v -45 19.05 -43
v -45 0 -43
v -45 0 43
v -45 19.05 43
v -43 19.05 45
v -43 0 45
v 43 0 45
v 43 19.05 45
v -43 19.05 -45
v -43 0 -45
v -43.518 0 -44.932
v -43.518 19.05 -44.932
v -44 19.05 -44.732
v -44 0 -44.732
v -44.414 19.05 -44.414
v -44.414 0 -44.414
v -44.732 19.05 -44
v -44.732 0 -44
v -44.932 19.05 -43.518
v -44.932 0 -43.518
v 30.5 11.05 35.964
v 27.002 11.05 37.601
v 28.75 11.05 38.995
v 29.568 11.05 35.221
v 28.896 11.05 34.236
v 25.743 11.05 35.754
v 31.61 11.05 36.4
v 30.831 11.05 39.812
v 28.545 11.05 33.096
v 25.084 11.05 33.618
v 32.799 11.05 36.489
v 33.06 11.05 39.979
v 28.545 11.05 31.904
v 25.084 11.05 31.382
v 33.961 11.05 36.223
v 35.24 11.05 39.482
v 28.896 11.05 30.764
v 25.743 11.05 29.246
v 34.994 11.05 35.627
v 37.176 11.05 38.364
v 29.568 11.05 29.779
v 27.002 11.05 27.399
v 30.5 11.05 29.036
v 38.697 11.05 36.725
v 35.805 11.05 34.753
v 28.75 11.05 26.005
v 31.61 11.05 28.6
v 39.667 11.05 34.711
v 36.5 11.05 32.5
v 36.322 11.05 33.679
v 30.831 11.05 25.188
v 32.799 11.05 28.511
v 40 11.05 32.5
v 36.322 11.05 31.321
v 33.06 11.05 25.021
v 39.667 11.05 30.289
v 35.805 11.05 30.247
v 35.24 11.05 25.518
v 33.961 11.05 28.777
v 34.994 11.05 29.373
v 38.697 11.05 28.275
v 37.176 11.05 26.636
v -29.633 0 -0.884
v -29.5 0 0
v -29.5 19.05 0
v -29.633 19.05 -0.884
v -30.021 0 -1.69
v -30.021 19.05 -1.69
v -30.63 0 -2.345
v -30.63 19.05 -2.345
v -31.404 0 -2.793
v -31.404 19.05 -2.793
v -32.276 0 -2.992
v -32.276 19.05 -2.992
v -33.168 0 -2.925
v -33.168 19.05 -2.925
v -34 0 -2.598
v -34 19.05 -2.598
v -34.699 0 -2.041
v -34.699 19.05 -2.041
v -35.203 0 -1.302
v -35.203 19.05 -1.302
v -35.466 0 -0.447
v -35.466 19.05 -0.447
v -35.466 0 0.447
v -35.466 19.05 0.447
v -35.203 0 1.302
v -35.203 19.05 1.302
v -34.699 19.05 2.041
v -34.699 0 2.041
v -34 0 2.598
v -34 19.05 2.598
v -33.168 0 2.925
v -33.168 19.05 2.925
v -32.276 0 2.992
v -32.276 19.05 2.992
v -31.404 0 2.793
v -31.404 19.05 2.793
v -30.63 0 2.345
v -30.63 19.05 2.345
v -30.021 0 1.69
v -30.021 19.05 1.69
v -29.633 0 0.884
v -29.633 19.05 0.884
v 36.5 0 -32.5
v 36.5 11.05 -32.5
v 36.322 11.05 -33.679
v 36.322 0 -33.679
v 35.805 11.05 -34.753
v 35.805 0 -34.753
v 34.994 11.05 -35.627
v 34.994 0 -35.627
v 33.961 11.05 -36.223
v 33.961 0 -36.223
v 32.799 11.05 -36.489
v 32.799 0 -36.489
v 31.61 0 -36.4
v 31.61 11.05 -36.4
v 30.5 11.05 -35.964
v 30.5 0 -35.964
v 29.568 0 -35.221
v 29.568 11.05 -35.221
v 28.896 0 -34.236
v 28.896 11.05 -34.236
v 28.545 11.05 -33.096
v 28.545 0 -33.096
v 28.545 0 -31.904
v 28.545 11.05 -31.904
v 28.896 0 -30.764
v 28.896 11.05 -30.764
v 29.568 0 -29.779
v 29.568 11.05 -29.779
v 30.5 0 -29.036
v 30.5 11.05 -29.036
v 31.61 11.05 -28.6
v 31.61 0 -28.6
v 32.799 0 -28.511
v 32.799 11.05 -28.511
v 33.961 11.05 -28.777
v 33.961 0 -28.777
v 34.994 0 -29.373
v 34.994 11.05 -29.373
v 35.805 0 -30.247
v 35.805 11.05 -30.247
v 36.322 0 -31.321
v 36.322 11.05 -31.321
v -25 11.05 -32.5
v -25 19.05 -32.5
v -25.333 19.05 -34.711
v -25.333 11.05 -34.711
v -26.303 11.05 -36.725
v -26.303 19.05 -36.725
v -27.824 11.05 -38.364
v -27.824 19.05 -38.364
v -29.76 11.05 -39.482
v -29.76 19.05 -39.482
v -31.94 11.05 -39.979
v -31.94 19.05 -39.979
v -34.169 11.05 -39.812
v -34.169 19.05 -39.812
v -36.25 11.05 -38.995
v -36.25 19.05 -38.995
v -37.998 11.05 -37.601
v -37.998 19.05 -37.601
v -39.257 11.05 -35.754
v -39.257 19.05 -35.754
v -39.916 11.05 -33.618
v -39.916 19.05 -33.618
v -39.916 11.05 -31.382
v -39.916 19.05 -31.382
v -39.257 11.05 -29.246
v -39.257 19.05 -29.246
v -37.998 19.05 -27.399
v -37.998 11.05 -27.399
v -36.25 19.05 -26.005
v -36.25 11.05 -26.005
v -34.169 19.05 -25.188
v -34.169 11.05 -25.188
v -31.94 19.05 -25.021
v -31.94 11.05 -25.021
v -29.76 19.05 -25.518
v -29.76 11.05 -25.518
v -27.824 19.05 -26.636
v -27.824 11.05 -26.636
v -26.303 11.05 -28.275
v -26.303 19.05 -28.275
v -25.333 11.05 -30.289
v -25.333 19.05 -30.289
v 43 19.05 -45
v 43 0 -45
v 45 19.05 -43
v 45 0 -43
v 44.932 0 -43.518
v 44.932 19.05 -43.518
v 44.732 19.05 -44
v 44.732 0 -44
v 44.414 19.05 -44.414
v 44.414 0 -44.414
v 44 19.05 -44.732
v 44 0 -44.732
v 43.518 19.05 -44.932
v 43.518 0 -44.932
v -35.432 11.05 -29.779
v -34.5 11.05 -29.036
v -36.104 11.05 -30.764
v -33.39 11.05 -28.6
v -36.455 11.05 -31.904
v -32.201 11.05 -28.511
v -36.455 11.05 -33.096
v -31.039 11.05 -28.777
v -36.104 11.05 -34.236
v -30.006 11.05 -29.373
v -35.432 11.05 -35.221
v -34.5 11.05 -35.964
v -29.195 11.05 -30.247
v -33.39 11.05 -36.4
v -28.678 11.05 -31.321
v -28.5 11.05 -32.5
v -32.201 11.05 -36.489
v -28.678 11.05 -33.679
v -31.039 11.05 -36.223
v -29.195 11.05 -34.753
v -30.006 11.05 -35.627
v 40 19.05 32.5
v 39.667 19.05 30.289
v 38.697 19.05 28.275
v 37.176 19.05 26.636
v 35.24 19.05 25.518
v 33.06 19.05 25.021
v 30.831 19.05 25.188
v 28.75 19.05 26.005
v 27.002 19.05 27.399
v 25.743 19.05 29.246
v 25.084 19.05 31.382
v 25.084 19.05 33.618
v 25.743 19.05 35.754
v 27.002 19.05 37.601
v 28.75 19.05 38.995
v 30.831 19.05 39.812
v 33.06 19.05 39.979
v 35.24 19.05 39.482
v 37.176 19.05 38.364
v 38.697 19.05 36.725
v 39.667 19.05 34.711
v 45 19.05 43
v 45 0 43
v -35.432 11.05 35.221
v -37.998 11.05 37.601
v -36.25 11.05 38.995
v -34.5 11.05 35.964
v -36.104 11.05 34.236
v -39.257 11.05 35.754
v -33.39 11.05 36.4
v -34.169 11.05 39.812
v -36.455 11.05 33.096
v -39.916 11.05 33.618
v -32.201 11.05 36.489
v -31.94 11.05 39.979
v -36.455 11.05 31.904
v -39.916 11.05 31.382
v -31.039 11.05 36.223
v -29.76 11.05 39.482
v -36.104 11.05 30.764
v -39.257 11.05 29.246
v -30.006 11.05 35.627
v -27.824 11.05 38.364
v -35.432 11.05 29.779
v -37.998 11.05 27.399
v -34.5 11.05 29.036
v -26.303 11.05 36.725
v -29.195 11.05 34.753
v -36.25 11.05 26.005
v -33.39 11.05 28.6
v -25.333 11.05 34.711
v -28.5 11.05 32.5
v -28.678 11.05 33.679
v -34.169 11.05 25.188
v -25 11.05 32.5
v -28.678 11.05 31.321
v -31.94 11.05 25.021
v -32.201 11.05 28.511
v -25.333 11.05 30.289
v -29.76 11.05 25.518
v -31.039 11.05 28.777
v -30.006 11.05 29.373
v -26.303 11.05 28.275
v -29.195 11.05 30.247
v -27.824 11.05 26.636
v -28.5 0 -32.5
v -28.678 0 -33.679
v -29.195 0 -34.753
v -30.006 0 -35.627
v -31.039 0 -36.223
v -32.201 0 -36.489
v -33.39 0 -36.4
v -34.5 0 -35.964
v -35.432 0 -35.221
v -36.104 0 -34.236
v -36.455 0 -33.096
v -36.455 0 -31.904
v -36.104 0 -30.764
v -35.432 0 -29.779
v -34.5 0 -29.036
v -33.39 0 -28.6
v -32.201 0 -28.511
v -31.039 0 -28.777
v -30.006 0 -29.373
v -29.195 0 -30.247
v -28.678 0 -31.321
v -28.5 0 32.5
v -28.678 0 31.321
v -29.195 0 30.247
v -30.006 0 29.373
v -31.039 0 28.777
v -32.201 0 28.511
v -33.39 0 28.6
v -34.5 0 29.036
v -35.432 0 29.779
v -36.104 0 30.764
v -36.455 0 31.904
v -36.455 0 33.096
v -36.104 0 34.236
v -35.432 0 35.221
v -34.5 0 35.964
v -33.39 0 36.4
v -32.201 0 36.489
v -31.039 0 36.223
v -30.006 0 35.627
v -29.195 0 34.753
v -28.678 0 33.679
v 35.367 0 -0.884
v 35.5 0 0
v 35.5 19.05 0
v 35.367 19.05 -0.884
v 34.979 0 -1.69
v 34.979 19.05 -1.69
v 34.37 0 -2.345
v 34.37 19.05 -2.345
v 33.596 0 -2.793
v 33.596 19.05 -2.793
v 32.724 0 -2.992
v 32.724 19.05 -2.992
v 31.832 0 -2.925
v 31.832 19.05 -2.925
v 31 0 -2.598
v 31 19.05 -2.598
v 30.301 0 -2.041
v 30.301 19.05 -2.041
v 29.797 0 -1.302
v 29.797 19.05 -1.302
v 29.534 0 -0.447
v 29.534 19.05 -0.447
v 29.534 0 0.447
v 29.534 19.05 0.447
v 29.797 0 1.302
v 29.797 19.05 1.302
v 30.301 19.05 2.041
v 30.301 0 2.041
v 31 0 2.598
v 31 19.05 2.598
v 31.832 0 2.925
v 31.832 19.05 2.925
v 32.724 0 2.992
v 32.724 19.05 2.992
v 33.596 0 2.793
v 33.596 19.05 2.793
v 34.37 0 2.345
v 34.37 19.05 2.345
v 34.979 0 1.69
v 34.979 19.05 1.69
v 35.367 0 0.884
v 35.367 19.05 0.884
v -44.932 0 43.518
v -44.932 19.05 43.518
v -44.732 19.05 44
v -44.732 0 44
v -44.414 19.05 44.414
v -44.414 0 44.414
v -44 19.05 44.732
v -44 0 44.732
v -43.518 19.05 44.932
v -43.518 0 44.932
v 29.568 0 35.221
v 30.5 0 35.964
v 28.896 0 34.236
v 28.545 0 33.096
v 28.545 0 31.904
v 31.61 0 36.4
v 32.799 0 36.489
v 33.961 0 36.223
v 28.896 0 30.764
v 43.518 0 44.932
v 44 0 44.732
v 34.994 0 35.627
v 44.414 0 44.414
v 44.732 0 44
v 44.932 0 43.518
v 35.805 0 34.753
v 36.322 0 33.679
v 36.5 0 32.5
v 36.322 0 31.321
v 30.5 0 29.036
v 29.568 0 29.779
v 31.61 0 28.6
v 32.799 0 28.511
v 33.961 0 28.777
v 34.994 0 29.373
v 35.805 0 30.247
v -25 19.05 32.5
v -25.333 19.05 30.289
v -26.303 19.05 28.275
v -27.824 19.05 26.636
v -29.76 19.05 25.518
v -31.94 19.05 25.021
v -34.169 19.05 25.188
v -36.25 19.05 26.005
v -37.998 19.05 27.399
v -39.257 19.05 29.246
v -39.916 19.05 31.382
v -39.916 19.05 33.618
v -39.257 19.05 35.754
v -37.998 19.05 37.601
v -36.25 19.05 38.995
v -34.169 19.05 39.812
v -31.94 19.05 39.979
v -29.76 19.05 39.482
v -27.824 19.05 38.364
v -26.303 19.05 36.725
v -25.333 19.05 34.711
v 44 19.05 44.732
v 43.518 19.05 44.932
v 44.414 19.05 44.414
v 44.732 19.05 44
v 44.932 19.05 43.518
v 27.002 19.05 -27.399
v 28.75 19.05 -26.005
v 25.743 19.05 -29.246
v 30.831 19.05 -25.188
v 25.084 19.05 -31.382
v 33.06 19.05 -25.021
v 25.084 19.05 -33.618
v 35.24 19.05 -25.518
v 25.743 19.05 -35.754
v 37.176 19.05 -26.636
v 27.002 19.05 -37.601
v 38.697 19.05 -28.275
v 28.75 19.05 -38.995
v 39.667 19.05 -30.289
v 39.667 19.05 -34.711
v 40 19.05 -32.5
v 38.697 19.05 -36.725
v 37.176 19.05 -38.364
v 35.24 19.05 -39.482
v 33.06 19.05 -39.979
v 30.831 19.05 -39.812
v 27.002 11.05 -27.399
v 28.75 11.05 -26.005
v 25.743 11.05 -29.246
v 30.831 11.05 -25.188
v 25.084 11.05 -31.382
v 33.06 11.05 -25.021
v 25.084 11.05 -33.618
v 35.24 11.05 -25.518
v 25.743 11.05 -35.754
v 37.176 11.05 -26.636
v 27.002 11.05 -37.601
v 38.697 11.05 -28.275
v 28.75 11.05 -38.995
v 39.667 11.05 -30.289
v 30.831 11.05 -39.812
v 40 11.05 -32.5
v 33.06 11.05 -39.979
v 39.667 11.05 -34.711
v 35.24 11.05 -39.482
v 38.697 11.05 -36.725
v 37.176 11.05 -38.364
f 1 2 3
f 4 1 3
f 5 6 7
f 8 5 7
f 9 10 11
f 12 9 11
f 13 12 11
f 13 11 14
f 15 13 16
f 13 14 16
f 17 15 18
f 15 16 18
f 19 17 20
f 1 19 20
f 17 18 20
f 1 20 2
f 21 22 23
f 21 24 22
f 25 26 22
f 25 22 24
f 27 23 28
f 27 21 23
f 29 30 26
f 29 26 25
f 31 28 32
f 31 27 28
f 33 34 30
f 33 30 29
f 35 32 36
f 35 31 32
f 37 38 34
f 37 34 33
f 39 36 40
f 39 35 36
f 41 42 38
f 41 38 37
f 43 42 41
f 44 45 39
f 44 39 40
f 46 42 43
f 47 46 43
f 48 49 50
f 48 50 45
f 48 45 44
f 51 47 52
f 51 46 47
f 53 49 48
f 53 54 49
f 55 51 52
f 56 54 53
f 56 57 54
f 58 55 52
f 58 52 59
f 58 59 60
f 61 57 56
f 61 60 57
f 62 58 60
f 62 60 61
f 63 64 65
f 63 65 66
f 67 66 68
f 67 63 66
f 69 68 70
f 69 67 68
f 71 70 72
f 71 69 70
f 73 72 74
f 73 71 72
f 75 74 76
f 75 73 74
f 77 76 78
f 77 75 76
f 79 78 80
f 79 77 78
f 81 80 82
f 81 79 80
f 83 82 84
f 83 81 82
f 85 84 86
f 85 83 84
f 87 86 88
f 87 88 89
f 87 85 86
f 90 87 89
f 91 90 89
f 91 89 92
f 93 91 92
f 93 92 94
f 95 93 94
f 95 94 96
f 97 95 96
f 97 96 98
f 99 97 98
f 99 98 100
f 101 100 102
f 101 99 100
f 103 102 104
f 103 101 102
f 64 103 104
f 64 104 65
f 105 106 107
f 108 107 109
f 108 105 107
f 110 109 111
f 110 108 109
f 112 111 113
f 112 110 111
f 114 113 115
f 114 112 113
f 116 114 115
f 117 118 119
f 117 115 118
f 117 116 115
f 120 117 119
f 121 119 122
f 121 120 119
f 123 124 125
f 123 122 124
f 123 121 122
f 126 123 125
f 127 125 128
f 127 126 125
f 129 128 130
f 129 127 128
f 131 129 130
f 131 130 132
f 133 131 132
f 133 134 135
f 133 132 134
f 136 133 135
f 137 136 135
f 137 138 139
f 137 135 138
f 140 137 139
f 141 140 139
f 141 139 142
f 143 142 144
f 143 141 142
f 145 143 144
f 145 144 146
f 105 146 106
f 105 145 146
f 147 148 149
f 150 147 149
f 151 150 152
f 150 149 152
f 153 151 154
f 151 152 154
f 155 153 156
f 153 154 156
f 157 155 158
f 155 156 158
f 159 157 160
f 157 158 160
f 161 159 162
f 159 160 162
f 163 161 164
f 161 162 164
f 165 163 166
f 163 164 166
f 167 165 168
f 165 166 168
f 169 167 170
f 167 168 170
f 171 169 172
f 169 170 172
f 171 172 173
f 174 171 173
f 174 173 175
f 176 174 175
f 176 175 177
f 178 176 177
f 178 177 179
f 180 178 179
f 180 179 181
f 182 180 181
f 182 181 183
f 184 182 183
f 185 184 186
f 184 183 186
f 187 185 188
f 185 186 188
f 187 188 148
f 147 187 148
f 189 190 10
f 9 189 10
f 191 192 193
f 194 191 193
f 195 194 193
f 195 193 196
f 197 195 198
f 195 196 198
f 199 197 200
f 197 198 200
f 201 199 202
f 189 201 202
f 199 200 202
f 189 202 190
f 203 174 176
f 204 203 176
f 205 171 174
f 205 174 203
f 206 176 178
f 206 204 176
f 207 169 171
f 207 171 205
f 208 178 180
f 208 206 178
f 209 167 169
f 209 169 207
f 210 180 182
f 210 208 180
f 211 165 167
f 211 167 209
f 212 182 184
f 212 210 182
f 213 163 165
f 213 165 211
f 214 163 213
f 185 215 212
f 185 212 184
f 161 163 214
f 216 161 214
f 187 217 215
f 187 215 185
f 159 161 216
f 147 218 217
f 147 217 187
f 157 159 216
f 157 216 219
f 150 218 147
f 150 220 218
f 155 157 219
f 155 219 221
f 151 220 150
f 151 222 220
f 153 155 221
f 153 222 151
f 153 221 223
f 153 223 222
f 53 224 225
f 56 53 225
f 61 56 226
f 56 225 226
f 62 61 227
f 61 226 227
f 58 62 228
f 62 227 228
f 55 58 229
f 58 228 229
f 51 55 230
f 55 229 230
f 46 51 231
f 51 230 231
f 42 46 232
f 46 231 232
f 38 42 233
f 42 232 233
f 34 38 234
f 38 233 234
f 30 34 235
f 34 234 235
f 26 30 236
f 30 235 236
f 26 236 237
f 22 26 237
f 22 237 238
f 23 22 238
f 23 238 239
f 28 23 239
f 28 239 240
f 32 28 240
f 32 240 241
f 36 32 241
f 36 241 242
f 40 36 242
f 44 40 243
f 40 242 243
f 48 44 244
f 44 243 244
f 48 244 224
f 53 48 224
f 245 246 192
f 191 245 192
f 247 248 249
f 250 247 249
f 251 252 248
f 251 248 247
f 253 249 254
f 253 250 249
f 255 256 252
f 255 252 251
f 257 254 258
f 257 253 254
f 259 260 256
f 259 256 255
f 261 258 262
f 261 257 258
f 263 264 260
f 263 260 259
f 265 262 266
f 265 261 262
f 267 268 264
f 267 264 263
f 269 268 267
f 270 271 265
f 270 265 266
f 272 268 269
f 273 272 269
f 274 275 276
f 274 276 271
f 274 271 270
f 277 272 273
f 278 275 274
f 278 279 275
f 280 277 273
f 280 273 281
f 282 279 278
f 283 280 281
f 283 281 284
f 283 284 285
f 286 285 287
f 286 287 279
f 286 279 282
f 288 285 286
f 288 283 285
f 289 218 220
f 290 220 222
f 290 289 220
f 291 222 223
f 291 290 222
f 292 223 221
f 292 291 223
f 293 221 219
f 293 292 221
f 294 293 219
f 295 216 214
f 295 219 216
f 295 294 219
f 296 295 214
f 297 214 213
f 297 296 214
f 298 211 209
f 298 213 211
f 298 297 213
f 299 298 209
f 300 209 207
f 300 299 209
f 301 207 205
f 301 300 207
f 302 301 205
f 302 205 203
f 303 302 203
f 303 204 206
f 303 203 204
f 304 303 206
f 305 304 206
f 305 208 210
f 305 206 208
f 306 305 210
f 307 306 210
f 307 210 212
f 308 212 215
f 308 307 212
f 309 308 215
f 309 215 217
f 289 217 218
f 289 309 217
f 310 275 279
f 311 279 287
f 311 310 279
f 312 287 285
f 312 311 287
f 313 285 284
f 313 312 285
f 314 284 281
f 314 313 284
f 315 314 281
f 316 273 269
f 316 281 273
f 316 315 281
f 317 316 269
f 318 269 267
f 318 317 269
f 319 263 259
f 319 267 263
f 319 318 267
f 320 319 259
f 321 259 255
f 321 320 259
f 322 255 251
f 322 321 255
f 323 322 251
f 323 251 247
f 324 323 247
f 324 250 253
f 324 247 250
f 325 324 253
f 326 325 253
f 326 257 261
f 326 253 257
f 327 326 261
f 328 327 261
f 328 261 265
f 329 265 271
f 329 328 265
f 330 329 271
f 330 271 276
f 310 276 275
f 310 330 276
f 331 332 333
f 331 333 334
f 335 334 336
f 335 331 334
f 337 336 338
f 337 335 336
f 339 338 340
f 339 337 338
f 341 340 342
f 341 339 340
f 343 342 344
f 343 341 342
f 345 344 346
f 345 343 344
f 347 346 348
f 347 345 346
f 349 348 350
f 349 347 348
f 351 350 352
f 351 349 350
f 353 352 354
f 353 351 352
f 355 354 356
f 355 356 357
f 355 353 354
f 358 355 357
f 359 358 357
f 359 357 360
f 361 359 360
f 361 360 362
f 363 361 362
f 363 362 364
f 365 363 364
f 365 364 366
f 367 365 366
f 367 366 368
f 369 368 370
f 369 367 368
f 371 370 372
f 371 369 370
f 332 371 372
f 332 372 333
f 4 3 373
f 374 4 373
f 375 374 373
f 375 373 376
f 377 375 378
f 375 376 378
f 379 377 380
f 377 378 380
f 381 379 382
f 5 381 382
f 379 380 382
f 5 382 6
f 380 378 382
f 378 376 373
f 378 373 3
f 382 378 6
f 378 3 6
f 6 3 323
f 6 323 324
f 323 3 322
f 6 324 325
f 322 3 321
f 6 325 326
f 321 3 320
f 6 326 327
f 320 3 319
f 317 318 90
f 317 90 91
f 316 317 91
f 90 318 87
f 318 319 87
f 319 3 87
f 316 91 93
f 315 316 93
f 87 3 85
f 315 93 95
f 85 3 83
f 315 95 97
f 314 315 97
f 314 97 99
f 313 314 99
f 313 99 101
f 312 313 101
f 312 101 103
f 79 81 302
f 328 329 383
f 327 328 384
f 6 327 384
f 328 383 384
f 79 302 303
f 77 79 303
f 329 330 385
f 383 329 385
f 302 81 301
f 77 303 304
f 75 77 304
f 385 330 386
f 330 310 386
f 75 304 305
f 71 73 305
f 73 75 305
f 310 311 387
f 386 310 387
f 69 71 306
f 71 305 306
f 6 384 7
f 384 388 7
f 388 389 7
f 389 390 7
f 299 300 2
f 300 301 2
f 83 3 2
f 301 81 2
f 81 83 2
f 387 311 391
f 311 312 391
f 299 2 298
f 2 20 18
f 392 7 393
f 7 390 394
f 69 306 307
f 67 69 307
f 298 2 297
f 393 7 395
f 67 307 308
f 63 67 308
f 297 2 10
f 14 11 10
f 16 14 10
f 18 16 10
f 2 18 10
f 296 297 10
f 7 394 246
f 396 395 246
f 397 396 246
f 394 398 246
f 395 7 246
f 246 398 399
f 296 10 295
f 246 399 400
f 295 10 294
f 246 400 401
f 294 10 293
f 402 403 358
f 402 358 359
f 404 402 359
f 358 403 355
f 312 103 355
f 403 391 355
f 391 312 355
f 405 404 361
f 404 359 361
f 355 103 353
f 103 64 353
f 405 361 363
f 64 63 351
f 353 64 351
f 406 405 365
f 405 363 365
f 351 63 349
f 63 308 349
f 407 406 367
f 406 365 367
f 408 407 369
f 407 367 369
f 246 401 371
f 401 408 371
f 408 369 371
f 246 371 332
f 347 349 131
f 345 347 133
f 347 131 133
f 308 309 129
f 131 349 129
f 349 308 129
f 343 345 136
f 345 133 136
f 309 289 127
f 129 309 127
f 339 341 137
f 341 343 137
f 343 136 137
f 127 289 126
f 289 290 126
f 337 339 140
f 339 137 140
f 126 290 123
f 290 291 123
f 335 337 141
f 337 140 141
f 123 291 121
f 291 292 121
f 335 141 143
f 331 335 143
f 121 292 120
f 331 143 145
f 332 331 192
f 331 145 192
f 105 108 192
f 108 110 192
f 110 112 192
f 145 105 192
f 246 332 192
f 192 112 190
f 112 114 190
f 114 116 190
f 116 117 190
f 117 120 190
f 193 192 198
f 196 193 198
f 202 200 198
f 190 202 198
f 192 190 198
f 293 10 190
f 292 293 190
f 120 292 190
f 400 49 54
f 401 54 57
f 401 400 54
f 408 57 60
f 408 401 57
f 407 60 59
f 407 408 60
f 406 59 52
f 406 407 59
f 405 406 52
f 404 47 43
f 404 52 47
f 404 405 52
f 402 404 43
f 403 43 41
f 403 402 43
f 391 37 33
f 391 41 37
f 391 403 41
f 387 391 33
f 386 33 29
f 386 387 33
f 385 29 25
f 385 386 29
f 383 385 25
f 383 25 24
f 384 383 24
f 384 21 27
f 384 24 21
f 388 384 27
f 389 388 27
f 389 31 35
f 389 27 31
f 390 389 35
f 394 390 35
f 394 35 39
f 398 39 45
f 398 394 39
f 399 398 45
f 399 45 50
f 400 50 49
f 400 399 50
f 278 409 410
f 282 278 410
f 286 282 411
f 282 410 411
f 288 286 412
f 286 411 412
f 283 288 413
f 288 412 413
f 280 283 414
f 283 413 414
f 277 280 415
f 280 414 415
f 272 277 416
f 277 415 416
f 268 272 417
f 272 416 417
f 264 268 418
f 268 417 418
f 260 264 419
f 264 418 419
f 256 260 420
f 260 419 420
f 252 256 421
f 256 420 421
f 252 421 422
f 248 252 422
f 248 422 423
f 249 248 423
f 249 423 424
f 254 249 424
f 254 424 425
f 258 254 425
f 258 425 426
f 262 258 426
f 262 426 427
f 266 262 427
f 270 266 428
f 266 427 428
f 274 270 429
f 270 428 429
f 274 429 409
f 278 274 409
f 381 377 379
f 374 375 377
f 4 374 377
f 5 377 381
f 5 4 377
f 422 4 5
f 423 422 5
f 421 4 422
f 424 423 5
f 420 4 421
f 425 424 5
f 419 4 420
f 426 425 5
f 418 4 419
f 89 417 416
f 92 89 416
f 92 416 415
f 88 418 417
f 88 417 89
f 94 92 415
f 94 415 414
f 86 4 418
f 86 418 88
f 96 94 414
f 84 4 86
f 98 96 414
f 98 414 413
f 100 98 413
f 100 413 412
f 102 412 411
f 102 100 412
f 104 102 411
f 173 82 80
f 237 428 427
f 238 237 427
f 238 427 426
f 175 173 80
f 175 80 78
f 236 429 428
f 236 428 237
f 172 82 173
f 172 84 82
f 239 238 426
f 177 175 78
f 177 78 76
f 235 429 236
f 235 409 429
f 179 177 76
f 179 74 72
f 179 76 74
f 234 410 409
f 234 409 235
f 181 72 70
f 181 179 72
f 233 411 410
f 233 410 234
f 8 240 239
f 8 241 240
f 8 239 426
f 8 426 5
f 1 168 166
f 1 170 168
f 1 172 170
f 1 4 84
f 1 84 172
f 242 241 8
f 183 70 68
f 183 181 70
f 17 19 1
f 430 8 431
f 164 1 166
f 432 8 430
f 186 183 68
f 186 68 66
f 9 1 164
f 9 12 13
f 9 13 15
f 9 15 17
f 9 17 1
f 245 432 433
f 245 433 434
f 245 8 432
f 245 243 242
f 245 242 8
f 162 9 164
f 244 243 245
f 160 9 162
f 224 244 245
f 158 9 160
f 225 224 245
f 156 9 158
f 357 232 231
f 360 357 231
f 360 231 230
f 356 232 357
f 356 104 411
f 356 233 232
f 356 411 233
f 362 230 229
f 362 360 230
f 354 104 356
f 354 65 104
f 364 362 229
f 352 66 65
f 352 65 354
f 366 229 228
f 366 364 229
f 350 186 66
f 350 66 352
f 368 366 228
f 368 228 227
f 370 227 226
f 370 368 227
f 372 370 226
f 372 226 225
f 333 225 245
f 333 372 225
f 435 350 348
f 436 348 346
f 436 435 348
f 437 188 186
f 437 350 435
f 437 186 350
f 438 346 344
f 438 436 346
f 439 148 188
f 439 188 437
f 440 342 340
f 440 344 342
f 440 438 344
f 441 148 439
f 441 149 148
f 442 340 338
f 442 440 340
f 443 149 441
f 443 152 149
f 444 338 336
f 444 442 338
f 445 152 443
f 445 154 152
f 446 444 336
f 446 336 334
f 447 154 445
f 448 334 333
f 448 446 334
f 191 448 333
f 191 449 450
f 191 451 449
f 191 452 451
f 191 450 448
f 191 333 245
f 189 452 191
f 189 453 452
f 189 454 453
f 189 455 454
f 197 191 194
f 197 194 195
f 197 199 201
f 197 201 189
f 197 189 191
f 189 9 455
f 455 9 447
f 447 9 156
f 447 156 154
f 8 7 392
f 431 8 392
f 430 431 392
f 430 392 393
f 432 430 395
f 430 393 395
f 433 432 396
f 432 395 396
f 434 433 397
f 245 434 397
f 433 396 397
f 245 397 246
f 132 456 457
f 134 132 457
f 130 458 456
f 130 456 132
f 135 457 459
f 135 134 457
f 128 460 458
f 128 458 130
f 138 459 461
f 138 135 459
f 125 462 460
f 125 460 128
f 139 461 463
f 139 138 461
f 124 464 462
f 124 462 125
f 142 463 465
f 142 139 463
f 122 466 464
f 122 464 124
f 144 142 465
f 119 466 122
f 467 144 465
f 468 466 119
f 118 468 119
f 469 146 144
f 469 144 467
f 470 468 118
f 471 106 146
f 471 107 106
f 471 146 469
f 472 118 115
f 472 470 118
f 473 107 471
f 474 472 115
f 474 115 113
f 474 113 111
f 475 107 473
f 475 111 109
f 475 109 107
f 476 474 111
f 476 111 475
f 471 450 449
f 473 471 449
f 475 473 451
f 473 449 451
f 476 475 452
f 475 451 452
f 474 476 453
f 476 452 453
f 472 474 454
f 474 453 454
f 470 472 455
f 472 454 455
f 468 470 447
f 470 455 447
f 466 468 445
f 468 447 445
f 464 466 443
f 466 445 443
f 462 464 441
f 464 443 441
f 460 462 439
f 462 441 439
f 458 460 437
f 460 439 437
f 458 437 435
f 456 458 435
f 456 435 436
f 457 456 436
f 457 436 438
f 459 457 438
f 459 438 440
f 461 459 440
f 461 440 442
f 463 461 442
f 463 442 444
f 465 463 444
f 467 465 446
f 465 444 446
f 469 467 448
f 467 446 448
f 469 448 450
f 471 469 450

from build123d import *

# Parameters (mm, degrees)
SKETCH1_R           = 4
SKETCH1_R_2         = 3
BOSS_EXTRUDE1_DEPTH = 19.05
SKETCH2_R           = 7.5
CUT_EXTRUDE1_DEPTH  = 8


with BuildPart() as part:
    # Sketch1 → Boss-Extrude1 (new body)
    with BuildSketch(Plane(origin=(0, 0, 0), x_dir=(1, 0, 0), z_dir=(0, 1, 0))):
        with BuildLine():
            Line((-43, -45), (43, -45))
            ThreePointArc((43, -45), (44.414213562, -44.414213562), (45, -43))
            Line((45, -43), (45, 43))
            ThreePointArc((45, 43), (44.414213562, 44.414213562), (43, 45))
            Line((43, 45), (-43, 45))
            ThreePointArc((-43, 45), (-44.414213562, 44.414213562), (-45, 43))
            Line((-45, 43), (-45, -43))
            ThreePointArc((-45, -43), (-44.414213562, -44.414213562), (-43, -45))
        make_face()
        with Locations((-32.5, 32.5)):
            Circle(SKETCH1_R, mode=Mode.SUBTRACT)
        with Locations((32.5, 32.5)):
            Circle(SKETCH1_R, mode=Mode.SUBTRACT)
        with Locations((32.5, -32.5)):
            Circle(SKETCH1_R, mode=Mode.SUBTRACT)
        with Locations((-32.5, -32.5)):
            Circle(SKETCH1_R, mode=Mode.SUBTRACT)
        with Locations((-32.5, 0)):
            Circle(SKETCH1_R_2, mode=Mode.SUBTRACT)
        with Locations((32.5, 0)):
            Circle(SKETCH1_R_2, mode=Mode.SUBTRACT)
    extrude(amount=BOSS_EXTRUDE1_DEPTH)

    # Sketch2 → Cut-Extrude1 (cut)
    with BuildSketch(Plane(origin=(0, 19.05, 0), x_dir=(1, 0, 0), z_dir=(0, 1, 0))):
        with Locations((-32.5, -32.5)):
            Circle(SKETCH2_R)
        with Locations((32.5, -32.5)):
            Circle(SKETCH2_R)
        with Locations((32.5, 32.5)):
            Circle(SKETCH2_R)
        with Locations((-32.5, 32.5)):
            Circle(SKETCH2_R)
    extrude(amount=-CUT_EXTRUDE1_DEPTH, mode=Mode.SUBTRACT)


solid = part.part
